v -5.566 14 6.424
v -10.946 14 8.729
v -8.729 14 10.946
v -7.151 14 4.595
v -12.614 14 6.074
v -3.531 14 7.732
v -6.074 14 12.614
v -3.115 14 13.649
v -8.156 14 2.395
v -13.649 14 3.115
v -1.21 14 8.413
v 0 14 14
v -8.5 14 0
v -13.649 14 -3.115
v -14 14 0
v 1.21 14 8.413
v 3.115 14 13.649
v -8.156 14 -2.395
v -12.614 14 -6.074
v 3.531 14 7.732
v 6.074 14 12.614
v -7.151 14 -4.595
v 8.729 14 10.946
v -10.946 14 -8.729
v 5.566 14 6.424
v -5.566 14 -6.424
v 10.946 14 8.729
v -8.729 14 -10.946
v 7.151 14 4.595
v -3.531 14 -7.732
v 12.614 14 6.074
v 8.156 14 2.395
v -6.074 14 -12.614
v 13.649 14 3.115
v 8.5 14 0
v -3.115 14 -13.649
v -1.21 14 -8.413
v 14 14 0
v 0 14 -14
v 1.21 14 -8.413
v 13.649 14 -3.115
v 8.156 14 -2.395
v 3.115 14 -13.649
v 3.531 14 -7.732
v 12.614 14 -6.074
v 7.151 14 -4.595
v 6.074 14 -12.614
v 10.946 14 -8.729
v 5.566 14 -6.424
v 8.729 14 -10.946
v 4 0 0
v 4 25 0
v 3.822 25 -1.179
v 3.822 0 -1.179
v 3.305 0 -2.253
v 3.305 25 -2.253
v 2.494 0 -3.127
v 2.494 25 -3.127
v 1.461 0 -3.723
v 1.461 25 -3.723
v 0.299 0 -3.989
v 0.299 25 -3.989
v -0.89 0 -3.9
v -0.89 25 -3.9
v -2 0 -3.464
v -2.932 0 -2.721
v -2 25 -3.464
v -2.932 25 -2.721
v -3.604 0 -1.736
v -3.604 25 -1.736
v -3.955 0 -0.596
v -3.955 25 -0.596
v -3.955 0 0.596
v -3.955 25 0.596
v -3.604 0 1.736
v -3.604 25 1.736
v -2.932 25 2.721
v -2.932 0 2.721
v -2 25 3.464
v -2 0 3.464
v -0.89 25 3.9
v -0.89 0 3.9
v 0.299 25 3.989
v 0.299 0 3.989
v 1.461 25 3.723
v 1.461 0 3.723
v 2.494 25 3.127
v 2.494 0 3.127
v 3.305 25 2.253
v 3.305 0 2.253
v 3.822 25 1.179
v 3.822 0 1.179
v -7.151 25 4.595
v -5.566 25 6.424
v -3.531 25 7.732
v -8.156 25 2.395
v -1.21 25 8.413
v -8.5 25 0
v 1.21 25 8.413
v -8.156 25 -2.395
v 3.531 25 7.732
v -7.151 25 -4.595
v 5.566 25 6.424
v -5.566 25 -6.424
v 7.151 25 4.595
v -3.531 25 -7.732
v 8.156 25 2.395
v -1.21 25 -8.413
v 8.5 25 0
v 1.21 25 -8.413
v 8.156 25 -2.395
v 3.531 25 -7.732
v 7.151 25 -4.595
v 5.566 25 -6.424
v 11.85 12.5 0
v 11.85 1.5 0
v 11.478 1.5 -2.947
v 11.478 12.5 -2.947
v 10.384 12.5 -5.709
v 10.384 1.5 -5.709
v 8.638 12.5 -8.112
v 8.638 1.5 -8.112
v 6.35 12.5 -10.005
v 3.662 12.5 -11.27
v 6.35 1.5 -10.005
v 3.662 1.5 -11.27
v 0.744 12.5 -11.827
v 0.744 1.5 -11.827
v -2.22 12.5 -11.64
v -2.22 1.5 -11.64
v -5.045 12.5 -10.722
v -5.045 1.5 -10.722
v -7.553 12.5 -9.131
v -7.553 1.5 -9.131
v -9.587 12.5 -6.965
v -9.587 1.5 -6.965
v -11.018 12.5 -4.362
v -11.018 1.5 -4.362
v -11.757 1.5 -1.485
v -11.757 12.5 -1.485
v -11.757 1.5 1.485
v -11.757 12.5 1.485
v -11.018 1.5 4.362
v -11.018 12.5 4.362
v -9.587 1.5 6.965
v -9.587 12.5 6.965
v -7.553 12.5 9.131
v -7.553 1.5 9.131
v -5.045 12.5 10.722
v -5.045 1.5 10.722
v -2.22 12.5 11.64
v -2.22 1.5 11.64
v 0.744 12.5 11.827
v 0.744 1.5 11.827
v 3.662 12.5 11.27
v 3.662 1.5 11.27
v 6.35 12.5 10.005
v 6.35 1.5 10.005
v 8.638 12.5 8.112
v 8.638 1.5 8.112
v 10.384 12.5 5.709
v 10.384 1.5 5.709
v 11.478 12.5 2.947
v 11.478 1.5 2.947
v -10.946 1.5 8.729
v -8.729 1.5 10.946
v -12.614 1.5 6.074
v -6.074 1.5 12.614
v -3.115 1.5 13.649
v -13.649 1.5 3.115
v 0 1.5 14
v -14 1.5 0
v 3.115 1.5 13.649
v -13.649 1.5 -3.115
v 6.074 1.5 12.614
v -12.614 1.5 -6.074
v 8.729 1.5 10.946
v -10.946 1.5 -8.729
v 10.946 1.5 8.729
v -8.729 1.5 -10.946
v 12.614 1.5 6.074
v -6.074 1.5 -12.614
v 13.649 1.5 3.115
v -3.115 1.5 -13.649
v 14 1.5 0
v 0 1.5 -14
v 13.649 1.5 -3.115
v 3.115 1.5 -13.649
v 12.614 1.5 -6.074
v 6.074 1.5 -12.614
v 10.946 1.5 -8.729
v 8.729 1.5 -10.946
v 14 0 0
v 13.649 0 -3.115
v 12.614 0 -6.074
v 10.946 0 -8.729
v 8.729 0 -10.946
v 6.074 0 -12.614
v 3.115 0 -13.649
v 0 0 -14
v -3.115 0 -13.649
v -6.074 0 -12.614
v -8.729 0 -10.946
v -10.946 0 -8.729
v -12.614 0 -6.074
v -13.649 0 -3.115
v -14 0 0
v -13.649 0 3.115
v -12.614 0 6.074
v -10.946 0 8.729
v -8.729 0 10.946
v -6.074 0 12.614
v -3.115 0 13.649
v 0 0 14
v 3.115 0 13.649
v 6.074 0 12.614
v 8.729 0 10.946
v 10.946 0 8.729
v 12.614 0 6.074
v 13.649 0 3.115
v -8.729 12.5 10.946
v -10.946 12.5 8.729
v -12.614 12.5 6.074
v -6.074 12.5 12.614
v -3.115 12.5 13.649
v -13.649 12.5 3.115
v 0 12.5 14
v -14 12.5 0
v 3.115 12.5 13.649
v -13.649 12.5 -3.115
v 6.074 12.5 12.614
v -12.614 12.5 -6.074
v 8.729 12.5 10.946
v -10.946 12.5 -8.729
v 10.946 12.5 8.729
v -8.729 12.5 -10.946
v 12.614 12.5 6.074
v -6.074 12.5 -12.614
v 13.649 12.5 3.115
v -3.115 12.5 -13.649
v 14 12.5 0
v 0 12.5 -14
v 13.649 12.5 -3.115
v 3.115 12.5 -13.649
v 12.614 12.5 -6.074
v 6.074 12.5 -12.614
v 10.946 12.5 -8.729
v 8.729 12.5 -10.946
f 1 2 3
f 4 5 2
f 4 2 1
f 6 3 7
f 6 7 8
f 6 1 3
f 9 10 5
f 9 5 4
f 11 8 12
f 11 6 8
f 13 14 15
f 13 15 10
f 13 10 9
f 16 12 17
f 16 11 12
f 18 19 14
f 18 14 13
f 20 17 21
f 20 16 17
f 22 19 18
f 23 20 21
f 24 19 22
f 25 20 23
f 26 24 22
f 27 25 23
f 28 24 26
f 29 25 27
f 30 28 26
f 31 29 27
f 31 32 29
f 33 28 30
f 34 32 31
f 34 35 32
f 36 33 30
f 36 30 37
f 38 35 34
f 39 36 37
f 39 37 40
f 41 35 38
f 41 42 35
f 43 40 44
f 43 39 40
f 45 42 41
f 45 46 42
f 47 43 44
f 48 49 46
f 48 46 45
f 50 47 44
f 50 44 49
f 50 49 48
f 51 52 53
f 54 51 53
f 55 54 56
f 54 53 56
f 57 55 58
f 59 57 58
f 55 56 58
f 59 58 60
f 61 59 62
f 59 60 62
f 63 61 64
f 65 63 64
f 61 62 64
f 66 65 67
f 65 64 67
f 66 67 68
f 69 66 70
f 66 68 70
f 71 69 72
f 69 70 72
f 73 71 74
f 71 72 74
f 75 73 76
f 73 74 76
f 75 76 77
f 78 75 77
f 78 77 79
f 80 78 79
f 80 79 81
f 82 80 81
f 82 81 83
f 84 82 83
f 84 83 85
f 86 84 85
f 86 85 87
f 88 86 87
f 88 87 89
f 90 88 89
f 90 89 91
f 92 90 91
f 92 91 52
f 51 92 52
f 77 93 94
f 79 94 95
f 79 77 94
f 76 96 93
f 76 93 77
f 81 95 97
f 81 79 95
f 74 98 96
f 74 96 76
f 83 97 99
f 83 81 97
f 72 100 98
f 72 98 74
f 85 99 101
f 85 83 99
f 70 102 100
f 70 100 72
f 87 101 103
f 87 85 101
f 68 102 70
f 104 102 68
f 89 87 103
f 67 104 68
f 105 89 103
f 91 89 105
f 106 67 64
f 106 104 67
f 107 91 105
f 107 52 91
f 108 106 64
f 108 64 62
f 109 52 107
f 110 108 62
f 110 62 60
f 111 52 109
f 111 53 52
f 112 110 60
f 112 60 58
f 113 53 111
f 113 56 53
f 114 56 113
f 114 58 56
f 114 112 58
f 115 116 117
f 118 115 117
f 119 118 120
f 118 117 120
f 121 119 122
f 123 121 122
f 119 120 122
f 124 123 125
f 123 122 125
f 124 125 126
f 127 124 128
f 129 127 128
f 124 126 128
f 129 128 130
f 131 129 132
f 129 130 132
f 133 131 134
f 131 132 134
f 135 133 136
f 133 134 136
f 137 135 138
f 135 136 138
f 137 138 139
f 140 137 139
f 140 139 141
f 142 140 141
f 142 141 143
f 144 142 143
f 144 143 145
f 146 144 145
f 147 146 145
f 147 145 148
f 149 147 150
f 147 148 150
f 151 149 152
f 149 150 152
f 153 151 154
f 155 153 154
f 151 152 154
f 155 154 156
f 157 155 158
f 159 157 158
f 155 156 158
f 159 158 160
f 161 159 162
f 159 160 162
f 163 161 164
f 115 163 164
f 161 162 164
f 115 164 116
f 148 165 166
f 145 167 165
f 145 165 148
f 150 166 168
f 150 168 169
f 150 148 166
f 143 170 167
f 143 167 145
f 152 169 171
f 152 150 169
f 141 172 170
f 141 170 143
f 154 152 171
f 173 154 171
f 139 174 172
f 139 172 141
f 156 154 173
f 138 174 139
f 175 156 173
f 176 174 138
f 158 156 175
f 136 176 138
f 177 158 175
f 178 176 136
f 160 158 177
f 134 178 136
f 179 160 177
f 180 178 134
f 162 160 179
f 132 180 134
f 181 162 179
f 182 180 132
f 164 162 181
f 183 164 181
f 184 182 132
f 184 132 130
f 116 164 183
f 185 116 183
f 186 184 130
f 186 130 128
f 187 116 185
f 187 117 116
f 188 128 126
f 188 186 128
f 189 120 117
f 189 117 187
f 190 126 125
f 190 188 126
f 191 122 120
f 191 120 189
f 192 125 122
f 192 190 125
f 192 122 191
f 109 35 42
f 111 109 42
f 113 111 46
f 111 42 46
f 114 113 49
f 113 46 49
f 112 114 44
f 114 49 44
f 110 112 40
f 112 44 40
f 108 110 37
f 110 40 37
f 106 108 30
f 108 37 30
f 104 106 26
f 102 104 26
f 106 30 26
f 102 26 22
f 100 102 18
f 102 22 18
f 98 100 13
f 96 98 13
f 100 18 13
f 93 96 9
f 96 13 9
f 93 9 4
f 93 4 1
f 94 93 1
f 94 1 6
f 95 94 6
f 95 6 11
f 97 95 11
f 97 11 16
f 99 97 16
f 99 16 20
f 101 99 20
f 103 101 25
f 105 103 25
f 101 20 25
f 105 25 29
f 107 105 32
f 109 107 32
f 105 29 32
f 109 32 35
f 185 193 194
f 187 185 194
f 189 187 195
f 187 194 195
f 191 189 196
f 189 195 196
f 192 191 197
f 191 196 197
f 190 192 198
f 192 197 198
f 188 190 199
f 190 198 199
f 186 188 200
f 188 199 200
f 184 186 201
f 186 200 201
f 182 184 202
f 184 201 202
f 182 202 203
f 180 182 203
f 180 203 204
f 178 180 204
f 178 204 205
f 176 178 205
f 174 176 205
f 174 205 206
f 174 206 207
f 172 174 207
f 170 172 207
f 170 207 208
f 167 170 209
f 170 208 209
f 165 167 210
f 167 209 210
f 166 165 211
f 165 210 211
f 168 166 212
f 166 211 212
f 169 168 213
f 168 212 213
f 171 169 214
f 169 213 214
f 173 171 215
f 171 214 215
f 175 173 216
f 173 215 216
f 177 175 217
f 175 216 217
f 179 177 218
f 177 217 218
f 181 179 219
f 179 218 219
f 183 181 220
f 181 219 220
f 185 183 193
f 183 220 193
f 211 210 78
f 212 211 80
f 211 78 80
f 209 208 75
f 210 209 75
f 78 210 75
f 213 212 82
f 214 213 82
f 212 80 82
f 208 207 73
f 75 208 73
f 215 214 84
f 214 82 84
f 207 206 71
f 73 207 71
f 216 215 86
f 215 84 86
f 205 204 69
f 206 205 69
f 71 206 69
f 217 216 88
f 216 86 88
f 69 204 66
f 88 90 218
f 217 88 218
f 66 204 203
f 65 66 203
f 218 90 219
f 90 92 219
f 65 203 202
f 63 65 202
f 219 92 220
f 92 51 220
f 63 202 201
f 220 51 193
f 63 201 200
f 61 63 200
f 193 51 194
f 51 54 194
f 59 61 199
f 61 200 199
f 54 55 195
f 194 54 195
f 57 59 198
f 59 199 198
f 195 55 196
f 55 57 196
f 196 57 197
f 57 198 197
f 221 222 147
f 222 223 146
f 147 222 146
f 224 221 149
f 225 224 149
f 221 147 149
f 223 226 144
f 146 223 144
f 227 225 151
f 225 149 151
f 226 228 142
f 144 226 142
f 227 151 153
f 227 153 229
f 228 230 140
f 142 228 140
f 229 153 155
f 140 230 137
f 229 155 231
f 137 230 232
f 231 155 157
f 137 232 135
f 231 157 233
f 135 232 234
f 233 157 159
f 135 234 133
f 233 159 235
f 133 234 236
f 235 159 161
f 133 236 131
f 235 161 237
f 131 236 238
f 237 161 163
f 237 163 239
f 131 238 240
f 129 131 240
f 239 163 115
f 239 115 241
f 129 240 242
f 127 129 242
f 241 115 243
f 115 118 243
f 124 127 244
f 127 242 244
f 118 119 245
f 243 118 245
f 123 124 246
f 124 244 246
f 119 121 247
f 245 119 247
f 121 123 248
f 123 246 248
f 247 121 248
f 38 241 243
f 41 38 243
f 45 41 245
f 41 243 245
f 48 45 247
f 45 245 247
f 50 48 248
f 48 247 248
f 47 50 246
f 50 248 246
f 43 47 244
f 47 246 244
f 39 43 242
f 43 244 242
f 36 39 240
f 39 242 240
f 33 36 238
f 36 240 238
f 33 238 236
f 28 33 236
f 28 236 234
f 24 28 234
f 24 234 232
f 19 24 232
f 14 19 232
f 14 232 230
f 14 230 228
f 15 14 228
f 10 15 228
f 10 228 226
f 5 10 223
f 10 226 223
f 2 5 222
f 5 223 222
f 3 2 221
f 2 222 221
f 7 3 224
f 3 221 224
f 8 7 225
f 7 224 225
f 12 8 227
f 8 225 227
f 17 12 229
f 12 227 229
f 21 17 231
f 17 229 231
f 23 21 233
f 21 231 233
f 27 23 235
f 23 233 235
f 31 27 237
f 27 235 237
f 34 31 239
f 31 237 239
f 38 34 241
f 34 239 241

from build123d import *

# Parameters (mm, degrees)
SKETCH1_R           = 14
BOSS_EXTRUDE1_DEPTH = 1.5
SKETCH2_R           = 11.85
BOSS_EXTRUDE2_DEPTH = 11
SKETCH3_R           = 14
BOSS_EXTRUDE3_DEPTH = 1.5
SKETCH4_R           = 8.5
BOSS_EXTRUDE4_DEPTH = 11
SKETCH5_R           = 4
CUT_EXTRUDE1_DEPTH  = 26


with BuildPart() as part:
    # Sketch1 → Boss-Extrude1 (new body)
    with BuildSketch(Plane(origin=(0, 0, 0), x_dir=(1, 0, 0), z_dir=(0, 1, 0))):
        Circle(SKETCH1_R)
    extrude(amount=BOSS_EXTRUDE1_DEPTH)

    # Sketch2 → Boss-Extrude2 (add)
    with BuildSketch(Plane(origin=(0, 1.5, 0), x_dir=(1, 0, 0), z_dir=(0, 1, 0))):
        Circle(SKETCH2_R)
    extrude(amount=BOSS_EXTRUDE2_DEPTH)

    # Sketch3 → Boss-Extrude3 (add)
    with BuildSketch(Plane(origin=(0, 12.5, 0), x_dir=(1, 0, 0), z_dir=(0, 1, 0))):
        Circle(SKETCH3_R)
    extrude(amount=BOSS_EXTRUDE3_DEPTH)

    # Sketch4 → Boss-Extrude4 (add)
    with BuildSketch(Plane(origin=(0, 14, 0), x_dir=(1, 0, 0), z_dir=(0, 1, 0))):
        Circle(SKETCH4_R)
    extrude(amount=BOSS_EXTRUDE4_DEPTH)

    # Sketch5 → Cut-Extrude1 (cut, through all)
    with BuildSketch(Plane(origin=(0, 25, 0), x_dir=(1, 0, 0), z_dir=(0, 1, 0))):
        Circle(SKETCH5_R)
    extrude(amount=-CUT_EXTRUDE1_DEPTH, mode=Mode.SUBTRACT)


solid = part.part
